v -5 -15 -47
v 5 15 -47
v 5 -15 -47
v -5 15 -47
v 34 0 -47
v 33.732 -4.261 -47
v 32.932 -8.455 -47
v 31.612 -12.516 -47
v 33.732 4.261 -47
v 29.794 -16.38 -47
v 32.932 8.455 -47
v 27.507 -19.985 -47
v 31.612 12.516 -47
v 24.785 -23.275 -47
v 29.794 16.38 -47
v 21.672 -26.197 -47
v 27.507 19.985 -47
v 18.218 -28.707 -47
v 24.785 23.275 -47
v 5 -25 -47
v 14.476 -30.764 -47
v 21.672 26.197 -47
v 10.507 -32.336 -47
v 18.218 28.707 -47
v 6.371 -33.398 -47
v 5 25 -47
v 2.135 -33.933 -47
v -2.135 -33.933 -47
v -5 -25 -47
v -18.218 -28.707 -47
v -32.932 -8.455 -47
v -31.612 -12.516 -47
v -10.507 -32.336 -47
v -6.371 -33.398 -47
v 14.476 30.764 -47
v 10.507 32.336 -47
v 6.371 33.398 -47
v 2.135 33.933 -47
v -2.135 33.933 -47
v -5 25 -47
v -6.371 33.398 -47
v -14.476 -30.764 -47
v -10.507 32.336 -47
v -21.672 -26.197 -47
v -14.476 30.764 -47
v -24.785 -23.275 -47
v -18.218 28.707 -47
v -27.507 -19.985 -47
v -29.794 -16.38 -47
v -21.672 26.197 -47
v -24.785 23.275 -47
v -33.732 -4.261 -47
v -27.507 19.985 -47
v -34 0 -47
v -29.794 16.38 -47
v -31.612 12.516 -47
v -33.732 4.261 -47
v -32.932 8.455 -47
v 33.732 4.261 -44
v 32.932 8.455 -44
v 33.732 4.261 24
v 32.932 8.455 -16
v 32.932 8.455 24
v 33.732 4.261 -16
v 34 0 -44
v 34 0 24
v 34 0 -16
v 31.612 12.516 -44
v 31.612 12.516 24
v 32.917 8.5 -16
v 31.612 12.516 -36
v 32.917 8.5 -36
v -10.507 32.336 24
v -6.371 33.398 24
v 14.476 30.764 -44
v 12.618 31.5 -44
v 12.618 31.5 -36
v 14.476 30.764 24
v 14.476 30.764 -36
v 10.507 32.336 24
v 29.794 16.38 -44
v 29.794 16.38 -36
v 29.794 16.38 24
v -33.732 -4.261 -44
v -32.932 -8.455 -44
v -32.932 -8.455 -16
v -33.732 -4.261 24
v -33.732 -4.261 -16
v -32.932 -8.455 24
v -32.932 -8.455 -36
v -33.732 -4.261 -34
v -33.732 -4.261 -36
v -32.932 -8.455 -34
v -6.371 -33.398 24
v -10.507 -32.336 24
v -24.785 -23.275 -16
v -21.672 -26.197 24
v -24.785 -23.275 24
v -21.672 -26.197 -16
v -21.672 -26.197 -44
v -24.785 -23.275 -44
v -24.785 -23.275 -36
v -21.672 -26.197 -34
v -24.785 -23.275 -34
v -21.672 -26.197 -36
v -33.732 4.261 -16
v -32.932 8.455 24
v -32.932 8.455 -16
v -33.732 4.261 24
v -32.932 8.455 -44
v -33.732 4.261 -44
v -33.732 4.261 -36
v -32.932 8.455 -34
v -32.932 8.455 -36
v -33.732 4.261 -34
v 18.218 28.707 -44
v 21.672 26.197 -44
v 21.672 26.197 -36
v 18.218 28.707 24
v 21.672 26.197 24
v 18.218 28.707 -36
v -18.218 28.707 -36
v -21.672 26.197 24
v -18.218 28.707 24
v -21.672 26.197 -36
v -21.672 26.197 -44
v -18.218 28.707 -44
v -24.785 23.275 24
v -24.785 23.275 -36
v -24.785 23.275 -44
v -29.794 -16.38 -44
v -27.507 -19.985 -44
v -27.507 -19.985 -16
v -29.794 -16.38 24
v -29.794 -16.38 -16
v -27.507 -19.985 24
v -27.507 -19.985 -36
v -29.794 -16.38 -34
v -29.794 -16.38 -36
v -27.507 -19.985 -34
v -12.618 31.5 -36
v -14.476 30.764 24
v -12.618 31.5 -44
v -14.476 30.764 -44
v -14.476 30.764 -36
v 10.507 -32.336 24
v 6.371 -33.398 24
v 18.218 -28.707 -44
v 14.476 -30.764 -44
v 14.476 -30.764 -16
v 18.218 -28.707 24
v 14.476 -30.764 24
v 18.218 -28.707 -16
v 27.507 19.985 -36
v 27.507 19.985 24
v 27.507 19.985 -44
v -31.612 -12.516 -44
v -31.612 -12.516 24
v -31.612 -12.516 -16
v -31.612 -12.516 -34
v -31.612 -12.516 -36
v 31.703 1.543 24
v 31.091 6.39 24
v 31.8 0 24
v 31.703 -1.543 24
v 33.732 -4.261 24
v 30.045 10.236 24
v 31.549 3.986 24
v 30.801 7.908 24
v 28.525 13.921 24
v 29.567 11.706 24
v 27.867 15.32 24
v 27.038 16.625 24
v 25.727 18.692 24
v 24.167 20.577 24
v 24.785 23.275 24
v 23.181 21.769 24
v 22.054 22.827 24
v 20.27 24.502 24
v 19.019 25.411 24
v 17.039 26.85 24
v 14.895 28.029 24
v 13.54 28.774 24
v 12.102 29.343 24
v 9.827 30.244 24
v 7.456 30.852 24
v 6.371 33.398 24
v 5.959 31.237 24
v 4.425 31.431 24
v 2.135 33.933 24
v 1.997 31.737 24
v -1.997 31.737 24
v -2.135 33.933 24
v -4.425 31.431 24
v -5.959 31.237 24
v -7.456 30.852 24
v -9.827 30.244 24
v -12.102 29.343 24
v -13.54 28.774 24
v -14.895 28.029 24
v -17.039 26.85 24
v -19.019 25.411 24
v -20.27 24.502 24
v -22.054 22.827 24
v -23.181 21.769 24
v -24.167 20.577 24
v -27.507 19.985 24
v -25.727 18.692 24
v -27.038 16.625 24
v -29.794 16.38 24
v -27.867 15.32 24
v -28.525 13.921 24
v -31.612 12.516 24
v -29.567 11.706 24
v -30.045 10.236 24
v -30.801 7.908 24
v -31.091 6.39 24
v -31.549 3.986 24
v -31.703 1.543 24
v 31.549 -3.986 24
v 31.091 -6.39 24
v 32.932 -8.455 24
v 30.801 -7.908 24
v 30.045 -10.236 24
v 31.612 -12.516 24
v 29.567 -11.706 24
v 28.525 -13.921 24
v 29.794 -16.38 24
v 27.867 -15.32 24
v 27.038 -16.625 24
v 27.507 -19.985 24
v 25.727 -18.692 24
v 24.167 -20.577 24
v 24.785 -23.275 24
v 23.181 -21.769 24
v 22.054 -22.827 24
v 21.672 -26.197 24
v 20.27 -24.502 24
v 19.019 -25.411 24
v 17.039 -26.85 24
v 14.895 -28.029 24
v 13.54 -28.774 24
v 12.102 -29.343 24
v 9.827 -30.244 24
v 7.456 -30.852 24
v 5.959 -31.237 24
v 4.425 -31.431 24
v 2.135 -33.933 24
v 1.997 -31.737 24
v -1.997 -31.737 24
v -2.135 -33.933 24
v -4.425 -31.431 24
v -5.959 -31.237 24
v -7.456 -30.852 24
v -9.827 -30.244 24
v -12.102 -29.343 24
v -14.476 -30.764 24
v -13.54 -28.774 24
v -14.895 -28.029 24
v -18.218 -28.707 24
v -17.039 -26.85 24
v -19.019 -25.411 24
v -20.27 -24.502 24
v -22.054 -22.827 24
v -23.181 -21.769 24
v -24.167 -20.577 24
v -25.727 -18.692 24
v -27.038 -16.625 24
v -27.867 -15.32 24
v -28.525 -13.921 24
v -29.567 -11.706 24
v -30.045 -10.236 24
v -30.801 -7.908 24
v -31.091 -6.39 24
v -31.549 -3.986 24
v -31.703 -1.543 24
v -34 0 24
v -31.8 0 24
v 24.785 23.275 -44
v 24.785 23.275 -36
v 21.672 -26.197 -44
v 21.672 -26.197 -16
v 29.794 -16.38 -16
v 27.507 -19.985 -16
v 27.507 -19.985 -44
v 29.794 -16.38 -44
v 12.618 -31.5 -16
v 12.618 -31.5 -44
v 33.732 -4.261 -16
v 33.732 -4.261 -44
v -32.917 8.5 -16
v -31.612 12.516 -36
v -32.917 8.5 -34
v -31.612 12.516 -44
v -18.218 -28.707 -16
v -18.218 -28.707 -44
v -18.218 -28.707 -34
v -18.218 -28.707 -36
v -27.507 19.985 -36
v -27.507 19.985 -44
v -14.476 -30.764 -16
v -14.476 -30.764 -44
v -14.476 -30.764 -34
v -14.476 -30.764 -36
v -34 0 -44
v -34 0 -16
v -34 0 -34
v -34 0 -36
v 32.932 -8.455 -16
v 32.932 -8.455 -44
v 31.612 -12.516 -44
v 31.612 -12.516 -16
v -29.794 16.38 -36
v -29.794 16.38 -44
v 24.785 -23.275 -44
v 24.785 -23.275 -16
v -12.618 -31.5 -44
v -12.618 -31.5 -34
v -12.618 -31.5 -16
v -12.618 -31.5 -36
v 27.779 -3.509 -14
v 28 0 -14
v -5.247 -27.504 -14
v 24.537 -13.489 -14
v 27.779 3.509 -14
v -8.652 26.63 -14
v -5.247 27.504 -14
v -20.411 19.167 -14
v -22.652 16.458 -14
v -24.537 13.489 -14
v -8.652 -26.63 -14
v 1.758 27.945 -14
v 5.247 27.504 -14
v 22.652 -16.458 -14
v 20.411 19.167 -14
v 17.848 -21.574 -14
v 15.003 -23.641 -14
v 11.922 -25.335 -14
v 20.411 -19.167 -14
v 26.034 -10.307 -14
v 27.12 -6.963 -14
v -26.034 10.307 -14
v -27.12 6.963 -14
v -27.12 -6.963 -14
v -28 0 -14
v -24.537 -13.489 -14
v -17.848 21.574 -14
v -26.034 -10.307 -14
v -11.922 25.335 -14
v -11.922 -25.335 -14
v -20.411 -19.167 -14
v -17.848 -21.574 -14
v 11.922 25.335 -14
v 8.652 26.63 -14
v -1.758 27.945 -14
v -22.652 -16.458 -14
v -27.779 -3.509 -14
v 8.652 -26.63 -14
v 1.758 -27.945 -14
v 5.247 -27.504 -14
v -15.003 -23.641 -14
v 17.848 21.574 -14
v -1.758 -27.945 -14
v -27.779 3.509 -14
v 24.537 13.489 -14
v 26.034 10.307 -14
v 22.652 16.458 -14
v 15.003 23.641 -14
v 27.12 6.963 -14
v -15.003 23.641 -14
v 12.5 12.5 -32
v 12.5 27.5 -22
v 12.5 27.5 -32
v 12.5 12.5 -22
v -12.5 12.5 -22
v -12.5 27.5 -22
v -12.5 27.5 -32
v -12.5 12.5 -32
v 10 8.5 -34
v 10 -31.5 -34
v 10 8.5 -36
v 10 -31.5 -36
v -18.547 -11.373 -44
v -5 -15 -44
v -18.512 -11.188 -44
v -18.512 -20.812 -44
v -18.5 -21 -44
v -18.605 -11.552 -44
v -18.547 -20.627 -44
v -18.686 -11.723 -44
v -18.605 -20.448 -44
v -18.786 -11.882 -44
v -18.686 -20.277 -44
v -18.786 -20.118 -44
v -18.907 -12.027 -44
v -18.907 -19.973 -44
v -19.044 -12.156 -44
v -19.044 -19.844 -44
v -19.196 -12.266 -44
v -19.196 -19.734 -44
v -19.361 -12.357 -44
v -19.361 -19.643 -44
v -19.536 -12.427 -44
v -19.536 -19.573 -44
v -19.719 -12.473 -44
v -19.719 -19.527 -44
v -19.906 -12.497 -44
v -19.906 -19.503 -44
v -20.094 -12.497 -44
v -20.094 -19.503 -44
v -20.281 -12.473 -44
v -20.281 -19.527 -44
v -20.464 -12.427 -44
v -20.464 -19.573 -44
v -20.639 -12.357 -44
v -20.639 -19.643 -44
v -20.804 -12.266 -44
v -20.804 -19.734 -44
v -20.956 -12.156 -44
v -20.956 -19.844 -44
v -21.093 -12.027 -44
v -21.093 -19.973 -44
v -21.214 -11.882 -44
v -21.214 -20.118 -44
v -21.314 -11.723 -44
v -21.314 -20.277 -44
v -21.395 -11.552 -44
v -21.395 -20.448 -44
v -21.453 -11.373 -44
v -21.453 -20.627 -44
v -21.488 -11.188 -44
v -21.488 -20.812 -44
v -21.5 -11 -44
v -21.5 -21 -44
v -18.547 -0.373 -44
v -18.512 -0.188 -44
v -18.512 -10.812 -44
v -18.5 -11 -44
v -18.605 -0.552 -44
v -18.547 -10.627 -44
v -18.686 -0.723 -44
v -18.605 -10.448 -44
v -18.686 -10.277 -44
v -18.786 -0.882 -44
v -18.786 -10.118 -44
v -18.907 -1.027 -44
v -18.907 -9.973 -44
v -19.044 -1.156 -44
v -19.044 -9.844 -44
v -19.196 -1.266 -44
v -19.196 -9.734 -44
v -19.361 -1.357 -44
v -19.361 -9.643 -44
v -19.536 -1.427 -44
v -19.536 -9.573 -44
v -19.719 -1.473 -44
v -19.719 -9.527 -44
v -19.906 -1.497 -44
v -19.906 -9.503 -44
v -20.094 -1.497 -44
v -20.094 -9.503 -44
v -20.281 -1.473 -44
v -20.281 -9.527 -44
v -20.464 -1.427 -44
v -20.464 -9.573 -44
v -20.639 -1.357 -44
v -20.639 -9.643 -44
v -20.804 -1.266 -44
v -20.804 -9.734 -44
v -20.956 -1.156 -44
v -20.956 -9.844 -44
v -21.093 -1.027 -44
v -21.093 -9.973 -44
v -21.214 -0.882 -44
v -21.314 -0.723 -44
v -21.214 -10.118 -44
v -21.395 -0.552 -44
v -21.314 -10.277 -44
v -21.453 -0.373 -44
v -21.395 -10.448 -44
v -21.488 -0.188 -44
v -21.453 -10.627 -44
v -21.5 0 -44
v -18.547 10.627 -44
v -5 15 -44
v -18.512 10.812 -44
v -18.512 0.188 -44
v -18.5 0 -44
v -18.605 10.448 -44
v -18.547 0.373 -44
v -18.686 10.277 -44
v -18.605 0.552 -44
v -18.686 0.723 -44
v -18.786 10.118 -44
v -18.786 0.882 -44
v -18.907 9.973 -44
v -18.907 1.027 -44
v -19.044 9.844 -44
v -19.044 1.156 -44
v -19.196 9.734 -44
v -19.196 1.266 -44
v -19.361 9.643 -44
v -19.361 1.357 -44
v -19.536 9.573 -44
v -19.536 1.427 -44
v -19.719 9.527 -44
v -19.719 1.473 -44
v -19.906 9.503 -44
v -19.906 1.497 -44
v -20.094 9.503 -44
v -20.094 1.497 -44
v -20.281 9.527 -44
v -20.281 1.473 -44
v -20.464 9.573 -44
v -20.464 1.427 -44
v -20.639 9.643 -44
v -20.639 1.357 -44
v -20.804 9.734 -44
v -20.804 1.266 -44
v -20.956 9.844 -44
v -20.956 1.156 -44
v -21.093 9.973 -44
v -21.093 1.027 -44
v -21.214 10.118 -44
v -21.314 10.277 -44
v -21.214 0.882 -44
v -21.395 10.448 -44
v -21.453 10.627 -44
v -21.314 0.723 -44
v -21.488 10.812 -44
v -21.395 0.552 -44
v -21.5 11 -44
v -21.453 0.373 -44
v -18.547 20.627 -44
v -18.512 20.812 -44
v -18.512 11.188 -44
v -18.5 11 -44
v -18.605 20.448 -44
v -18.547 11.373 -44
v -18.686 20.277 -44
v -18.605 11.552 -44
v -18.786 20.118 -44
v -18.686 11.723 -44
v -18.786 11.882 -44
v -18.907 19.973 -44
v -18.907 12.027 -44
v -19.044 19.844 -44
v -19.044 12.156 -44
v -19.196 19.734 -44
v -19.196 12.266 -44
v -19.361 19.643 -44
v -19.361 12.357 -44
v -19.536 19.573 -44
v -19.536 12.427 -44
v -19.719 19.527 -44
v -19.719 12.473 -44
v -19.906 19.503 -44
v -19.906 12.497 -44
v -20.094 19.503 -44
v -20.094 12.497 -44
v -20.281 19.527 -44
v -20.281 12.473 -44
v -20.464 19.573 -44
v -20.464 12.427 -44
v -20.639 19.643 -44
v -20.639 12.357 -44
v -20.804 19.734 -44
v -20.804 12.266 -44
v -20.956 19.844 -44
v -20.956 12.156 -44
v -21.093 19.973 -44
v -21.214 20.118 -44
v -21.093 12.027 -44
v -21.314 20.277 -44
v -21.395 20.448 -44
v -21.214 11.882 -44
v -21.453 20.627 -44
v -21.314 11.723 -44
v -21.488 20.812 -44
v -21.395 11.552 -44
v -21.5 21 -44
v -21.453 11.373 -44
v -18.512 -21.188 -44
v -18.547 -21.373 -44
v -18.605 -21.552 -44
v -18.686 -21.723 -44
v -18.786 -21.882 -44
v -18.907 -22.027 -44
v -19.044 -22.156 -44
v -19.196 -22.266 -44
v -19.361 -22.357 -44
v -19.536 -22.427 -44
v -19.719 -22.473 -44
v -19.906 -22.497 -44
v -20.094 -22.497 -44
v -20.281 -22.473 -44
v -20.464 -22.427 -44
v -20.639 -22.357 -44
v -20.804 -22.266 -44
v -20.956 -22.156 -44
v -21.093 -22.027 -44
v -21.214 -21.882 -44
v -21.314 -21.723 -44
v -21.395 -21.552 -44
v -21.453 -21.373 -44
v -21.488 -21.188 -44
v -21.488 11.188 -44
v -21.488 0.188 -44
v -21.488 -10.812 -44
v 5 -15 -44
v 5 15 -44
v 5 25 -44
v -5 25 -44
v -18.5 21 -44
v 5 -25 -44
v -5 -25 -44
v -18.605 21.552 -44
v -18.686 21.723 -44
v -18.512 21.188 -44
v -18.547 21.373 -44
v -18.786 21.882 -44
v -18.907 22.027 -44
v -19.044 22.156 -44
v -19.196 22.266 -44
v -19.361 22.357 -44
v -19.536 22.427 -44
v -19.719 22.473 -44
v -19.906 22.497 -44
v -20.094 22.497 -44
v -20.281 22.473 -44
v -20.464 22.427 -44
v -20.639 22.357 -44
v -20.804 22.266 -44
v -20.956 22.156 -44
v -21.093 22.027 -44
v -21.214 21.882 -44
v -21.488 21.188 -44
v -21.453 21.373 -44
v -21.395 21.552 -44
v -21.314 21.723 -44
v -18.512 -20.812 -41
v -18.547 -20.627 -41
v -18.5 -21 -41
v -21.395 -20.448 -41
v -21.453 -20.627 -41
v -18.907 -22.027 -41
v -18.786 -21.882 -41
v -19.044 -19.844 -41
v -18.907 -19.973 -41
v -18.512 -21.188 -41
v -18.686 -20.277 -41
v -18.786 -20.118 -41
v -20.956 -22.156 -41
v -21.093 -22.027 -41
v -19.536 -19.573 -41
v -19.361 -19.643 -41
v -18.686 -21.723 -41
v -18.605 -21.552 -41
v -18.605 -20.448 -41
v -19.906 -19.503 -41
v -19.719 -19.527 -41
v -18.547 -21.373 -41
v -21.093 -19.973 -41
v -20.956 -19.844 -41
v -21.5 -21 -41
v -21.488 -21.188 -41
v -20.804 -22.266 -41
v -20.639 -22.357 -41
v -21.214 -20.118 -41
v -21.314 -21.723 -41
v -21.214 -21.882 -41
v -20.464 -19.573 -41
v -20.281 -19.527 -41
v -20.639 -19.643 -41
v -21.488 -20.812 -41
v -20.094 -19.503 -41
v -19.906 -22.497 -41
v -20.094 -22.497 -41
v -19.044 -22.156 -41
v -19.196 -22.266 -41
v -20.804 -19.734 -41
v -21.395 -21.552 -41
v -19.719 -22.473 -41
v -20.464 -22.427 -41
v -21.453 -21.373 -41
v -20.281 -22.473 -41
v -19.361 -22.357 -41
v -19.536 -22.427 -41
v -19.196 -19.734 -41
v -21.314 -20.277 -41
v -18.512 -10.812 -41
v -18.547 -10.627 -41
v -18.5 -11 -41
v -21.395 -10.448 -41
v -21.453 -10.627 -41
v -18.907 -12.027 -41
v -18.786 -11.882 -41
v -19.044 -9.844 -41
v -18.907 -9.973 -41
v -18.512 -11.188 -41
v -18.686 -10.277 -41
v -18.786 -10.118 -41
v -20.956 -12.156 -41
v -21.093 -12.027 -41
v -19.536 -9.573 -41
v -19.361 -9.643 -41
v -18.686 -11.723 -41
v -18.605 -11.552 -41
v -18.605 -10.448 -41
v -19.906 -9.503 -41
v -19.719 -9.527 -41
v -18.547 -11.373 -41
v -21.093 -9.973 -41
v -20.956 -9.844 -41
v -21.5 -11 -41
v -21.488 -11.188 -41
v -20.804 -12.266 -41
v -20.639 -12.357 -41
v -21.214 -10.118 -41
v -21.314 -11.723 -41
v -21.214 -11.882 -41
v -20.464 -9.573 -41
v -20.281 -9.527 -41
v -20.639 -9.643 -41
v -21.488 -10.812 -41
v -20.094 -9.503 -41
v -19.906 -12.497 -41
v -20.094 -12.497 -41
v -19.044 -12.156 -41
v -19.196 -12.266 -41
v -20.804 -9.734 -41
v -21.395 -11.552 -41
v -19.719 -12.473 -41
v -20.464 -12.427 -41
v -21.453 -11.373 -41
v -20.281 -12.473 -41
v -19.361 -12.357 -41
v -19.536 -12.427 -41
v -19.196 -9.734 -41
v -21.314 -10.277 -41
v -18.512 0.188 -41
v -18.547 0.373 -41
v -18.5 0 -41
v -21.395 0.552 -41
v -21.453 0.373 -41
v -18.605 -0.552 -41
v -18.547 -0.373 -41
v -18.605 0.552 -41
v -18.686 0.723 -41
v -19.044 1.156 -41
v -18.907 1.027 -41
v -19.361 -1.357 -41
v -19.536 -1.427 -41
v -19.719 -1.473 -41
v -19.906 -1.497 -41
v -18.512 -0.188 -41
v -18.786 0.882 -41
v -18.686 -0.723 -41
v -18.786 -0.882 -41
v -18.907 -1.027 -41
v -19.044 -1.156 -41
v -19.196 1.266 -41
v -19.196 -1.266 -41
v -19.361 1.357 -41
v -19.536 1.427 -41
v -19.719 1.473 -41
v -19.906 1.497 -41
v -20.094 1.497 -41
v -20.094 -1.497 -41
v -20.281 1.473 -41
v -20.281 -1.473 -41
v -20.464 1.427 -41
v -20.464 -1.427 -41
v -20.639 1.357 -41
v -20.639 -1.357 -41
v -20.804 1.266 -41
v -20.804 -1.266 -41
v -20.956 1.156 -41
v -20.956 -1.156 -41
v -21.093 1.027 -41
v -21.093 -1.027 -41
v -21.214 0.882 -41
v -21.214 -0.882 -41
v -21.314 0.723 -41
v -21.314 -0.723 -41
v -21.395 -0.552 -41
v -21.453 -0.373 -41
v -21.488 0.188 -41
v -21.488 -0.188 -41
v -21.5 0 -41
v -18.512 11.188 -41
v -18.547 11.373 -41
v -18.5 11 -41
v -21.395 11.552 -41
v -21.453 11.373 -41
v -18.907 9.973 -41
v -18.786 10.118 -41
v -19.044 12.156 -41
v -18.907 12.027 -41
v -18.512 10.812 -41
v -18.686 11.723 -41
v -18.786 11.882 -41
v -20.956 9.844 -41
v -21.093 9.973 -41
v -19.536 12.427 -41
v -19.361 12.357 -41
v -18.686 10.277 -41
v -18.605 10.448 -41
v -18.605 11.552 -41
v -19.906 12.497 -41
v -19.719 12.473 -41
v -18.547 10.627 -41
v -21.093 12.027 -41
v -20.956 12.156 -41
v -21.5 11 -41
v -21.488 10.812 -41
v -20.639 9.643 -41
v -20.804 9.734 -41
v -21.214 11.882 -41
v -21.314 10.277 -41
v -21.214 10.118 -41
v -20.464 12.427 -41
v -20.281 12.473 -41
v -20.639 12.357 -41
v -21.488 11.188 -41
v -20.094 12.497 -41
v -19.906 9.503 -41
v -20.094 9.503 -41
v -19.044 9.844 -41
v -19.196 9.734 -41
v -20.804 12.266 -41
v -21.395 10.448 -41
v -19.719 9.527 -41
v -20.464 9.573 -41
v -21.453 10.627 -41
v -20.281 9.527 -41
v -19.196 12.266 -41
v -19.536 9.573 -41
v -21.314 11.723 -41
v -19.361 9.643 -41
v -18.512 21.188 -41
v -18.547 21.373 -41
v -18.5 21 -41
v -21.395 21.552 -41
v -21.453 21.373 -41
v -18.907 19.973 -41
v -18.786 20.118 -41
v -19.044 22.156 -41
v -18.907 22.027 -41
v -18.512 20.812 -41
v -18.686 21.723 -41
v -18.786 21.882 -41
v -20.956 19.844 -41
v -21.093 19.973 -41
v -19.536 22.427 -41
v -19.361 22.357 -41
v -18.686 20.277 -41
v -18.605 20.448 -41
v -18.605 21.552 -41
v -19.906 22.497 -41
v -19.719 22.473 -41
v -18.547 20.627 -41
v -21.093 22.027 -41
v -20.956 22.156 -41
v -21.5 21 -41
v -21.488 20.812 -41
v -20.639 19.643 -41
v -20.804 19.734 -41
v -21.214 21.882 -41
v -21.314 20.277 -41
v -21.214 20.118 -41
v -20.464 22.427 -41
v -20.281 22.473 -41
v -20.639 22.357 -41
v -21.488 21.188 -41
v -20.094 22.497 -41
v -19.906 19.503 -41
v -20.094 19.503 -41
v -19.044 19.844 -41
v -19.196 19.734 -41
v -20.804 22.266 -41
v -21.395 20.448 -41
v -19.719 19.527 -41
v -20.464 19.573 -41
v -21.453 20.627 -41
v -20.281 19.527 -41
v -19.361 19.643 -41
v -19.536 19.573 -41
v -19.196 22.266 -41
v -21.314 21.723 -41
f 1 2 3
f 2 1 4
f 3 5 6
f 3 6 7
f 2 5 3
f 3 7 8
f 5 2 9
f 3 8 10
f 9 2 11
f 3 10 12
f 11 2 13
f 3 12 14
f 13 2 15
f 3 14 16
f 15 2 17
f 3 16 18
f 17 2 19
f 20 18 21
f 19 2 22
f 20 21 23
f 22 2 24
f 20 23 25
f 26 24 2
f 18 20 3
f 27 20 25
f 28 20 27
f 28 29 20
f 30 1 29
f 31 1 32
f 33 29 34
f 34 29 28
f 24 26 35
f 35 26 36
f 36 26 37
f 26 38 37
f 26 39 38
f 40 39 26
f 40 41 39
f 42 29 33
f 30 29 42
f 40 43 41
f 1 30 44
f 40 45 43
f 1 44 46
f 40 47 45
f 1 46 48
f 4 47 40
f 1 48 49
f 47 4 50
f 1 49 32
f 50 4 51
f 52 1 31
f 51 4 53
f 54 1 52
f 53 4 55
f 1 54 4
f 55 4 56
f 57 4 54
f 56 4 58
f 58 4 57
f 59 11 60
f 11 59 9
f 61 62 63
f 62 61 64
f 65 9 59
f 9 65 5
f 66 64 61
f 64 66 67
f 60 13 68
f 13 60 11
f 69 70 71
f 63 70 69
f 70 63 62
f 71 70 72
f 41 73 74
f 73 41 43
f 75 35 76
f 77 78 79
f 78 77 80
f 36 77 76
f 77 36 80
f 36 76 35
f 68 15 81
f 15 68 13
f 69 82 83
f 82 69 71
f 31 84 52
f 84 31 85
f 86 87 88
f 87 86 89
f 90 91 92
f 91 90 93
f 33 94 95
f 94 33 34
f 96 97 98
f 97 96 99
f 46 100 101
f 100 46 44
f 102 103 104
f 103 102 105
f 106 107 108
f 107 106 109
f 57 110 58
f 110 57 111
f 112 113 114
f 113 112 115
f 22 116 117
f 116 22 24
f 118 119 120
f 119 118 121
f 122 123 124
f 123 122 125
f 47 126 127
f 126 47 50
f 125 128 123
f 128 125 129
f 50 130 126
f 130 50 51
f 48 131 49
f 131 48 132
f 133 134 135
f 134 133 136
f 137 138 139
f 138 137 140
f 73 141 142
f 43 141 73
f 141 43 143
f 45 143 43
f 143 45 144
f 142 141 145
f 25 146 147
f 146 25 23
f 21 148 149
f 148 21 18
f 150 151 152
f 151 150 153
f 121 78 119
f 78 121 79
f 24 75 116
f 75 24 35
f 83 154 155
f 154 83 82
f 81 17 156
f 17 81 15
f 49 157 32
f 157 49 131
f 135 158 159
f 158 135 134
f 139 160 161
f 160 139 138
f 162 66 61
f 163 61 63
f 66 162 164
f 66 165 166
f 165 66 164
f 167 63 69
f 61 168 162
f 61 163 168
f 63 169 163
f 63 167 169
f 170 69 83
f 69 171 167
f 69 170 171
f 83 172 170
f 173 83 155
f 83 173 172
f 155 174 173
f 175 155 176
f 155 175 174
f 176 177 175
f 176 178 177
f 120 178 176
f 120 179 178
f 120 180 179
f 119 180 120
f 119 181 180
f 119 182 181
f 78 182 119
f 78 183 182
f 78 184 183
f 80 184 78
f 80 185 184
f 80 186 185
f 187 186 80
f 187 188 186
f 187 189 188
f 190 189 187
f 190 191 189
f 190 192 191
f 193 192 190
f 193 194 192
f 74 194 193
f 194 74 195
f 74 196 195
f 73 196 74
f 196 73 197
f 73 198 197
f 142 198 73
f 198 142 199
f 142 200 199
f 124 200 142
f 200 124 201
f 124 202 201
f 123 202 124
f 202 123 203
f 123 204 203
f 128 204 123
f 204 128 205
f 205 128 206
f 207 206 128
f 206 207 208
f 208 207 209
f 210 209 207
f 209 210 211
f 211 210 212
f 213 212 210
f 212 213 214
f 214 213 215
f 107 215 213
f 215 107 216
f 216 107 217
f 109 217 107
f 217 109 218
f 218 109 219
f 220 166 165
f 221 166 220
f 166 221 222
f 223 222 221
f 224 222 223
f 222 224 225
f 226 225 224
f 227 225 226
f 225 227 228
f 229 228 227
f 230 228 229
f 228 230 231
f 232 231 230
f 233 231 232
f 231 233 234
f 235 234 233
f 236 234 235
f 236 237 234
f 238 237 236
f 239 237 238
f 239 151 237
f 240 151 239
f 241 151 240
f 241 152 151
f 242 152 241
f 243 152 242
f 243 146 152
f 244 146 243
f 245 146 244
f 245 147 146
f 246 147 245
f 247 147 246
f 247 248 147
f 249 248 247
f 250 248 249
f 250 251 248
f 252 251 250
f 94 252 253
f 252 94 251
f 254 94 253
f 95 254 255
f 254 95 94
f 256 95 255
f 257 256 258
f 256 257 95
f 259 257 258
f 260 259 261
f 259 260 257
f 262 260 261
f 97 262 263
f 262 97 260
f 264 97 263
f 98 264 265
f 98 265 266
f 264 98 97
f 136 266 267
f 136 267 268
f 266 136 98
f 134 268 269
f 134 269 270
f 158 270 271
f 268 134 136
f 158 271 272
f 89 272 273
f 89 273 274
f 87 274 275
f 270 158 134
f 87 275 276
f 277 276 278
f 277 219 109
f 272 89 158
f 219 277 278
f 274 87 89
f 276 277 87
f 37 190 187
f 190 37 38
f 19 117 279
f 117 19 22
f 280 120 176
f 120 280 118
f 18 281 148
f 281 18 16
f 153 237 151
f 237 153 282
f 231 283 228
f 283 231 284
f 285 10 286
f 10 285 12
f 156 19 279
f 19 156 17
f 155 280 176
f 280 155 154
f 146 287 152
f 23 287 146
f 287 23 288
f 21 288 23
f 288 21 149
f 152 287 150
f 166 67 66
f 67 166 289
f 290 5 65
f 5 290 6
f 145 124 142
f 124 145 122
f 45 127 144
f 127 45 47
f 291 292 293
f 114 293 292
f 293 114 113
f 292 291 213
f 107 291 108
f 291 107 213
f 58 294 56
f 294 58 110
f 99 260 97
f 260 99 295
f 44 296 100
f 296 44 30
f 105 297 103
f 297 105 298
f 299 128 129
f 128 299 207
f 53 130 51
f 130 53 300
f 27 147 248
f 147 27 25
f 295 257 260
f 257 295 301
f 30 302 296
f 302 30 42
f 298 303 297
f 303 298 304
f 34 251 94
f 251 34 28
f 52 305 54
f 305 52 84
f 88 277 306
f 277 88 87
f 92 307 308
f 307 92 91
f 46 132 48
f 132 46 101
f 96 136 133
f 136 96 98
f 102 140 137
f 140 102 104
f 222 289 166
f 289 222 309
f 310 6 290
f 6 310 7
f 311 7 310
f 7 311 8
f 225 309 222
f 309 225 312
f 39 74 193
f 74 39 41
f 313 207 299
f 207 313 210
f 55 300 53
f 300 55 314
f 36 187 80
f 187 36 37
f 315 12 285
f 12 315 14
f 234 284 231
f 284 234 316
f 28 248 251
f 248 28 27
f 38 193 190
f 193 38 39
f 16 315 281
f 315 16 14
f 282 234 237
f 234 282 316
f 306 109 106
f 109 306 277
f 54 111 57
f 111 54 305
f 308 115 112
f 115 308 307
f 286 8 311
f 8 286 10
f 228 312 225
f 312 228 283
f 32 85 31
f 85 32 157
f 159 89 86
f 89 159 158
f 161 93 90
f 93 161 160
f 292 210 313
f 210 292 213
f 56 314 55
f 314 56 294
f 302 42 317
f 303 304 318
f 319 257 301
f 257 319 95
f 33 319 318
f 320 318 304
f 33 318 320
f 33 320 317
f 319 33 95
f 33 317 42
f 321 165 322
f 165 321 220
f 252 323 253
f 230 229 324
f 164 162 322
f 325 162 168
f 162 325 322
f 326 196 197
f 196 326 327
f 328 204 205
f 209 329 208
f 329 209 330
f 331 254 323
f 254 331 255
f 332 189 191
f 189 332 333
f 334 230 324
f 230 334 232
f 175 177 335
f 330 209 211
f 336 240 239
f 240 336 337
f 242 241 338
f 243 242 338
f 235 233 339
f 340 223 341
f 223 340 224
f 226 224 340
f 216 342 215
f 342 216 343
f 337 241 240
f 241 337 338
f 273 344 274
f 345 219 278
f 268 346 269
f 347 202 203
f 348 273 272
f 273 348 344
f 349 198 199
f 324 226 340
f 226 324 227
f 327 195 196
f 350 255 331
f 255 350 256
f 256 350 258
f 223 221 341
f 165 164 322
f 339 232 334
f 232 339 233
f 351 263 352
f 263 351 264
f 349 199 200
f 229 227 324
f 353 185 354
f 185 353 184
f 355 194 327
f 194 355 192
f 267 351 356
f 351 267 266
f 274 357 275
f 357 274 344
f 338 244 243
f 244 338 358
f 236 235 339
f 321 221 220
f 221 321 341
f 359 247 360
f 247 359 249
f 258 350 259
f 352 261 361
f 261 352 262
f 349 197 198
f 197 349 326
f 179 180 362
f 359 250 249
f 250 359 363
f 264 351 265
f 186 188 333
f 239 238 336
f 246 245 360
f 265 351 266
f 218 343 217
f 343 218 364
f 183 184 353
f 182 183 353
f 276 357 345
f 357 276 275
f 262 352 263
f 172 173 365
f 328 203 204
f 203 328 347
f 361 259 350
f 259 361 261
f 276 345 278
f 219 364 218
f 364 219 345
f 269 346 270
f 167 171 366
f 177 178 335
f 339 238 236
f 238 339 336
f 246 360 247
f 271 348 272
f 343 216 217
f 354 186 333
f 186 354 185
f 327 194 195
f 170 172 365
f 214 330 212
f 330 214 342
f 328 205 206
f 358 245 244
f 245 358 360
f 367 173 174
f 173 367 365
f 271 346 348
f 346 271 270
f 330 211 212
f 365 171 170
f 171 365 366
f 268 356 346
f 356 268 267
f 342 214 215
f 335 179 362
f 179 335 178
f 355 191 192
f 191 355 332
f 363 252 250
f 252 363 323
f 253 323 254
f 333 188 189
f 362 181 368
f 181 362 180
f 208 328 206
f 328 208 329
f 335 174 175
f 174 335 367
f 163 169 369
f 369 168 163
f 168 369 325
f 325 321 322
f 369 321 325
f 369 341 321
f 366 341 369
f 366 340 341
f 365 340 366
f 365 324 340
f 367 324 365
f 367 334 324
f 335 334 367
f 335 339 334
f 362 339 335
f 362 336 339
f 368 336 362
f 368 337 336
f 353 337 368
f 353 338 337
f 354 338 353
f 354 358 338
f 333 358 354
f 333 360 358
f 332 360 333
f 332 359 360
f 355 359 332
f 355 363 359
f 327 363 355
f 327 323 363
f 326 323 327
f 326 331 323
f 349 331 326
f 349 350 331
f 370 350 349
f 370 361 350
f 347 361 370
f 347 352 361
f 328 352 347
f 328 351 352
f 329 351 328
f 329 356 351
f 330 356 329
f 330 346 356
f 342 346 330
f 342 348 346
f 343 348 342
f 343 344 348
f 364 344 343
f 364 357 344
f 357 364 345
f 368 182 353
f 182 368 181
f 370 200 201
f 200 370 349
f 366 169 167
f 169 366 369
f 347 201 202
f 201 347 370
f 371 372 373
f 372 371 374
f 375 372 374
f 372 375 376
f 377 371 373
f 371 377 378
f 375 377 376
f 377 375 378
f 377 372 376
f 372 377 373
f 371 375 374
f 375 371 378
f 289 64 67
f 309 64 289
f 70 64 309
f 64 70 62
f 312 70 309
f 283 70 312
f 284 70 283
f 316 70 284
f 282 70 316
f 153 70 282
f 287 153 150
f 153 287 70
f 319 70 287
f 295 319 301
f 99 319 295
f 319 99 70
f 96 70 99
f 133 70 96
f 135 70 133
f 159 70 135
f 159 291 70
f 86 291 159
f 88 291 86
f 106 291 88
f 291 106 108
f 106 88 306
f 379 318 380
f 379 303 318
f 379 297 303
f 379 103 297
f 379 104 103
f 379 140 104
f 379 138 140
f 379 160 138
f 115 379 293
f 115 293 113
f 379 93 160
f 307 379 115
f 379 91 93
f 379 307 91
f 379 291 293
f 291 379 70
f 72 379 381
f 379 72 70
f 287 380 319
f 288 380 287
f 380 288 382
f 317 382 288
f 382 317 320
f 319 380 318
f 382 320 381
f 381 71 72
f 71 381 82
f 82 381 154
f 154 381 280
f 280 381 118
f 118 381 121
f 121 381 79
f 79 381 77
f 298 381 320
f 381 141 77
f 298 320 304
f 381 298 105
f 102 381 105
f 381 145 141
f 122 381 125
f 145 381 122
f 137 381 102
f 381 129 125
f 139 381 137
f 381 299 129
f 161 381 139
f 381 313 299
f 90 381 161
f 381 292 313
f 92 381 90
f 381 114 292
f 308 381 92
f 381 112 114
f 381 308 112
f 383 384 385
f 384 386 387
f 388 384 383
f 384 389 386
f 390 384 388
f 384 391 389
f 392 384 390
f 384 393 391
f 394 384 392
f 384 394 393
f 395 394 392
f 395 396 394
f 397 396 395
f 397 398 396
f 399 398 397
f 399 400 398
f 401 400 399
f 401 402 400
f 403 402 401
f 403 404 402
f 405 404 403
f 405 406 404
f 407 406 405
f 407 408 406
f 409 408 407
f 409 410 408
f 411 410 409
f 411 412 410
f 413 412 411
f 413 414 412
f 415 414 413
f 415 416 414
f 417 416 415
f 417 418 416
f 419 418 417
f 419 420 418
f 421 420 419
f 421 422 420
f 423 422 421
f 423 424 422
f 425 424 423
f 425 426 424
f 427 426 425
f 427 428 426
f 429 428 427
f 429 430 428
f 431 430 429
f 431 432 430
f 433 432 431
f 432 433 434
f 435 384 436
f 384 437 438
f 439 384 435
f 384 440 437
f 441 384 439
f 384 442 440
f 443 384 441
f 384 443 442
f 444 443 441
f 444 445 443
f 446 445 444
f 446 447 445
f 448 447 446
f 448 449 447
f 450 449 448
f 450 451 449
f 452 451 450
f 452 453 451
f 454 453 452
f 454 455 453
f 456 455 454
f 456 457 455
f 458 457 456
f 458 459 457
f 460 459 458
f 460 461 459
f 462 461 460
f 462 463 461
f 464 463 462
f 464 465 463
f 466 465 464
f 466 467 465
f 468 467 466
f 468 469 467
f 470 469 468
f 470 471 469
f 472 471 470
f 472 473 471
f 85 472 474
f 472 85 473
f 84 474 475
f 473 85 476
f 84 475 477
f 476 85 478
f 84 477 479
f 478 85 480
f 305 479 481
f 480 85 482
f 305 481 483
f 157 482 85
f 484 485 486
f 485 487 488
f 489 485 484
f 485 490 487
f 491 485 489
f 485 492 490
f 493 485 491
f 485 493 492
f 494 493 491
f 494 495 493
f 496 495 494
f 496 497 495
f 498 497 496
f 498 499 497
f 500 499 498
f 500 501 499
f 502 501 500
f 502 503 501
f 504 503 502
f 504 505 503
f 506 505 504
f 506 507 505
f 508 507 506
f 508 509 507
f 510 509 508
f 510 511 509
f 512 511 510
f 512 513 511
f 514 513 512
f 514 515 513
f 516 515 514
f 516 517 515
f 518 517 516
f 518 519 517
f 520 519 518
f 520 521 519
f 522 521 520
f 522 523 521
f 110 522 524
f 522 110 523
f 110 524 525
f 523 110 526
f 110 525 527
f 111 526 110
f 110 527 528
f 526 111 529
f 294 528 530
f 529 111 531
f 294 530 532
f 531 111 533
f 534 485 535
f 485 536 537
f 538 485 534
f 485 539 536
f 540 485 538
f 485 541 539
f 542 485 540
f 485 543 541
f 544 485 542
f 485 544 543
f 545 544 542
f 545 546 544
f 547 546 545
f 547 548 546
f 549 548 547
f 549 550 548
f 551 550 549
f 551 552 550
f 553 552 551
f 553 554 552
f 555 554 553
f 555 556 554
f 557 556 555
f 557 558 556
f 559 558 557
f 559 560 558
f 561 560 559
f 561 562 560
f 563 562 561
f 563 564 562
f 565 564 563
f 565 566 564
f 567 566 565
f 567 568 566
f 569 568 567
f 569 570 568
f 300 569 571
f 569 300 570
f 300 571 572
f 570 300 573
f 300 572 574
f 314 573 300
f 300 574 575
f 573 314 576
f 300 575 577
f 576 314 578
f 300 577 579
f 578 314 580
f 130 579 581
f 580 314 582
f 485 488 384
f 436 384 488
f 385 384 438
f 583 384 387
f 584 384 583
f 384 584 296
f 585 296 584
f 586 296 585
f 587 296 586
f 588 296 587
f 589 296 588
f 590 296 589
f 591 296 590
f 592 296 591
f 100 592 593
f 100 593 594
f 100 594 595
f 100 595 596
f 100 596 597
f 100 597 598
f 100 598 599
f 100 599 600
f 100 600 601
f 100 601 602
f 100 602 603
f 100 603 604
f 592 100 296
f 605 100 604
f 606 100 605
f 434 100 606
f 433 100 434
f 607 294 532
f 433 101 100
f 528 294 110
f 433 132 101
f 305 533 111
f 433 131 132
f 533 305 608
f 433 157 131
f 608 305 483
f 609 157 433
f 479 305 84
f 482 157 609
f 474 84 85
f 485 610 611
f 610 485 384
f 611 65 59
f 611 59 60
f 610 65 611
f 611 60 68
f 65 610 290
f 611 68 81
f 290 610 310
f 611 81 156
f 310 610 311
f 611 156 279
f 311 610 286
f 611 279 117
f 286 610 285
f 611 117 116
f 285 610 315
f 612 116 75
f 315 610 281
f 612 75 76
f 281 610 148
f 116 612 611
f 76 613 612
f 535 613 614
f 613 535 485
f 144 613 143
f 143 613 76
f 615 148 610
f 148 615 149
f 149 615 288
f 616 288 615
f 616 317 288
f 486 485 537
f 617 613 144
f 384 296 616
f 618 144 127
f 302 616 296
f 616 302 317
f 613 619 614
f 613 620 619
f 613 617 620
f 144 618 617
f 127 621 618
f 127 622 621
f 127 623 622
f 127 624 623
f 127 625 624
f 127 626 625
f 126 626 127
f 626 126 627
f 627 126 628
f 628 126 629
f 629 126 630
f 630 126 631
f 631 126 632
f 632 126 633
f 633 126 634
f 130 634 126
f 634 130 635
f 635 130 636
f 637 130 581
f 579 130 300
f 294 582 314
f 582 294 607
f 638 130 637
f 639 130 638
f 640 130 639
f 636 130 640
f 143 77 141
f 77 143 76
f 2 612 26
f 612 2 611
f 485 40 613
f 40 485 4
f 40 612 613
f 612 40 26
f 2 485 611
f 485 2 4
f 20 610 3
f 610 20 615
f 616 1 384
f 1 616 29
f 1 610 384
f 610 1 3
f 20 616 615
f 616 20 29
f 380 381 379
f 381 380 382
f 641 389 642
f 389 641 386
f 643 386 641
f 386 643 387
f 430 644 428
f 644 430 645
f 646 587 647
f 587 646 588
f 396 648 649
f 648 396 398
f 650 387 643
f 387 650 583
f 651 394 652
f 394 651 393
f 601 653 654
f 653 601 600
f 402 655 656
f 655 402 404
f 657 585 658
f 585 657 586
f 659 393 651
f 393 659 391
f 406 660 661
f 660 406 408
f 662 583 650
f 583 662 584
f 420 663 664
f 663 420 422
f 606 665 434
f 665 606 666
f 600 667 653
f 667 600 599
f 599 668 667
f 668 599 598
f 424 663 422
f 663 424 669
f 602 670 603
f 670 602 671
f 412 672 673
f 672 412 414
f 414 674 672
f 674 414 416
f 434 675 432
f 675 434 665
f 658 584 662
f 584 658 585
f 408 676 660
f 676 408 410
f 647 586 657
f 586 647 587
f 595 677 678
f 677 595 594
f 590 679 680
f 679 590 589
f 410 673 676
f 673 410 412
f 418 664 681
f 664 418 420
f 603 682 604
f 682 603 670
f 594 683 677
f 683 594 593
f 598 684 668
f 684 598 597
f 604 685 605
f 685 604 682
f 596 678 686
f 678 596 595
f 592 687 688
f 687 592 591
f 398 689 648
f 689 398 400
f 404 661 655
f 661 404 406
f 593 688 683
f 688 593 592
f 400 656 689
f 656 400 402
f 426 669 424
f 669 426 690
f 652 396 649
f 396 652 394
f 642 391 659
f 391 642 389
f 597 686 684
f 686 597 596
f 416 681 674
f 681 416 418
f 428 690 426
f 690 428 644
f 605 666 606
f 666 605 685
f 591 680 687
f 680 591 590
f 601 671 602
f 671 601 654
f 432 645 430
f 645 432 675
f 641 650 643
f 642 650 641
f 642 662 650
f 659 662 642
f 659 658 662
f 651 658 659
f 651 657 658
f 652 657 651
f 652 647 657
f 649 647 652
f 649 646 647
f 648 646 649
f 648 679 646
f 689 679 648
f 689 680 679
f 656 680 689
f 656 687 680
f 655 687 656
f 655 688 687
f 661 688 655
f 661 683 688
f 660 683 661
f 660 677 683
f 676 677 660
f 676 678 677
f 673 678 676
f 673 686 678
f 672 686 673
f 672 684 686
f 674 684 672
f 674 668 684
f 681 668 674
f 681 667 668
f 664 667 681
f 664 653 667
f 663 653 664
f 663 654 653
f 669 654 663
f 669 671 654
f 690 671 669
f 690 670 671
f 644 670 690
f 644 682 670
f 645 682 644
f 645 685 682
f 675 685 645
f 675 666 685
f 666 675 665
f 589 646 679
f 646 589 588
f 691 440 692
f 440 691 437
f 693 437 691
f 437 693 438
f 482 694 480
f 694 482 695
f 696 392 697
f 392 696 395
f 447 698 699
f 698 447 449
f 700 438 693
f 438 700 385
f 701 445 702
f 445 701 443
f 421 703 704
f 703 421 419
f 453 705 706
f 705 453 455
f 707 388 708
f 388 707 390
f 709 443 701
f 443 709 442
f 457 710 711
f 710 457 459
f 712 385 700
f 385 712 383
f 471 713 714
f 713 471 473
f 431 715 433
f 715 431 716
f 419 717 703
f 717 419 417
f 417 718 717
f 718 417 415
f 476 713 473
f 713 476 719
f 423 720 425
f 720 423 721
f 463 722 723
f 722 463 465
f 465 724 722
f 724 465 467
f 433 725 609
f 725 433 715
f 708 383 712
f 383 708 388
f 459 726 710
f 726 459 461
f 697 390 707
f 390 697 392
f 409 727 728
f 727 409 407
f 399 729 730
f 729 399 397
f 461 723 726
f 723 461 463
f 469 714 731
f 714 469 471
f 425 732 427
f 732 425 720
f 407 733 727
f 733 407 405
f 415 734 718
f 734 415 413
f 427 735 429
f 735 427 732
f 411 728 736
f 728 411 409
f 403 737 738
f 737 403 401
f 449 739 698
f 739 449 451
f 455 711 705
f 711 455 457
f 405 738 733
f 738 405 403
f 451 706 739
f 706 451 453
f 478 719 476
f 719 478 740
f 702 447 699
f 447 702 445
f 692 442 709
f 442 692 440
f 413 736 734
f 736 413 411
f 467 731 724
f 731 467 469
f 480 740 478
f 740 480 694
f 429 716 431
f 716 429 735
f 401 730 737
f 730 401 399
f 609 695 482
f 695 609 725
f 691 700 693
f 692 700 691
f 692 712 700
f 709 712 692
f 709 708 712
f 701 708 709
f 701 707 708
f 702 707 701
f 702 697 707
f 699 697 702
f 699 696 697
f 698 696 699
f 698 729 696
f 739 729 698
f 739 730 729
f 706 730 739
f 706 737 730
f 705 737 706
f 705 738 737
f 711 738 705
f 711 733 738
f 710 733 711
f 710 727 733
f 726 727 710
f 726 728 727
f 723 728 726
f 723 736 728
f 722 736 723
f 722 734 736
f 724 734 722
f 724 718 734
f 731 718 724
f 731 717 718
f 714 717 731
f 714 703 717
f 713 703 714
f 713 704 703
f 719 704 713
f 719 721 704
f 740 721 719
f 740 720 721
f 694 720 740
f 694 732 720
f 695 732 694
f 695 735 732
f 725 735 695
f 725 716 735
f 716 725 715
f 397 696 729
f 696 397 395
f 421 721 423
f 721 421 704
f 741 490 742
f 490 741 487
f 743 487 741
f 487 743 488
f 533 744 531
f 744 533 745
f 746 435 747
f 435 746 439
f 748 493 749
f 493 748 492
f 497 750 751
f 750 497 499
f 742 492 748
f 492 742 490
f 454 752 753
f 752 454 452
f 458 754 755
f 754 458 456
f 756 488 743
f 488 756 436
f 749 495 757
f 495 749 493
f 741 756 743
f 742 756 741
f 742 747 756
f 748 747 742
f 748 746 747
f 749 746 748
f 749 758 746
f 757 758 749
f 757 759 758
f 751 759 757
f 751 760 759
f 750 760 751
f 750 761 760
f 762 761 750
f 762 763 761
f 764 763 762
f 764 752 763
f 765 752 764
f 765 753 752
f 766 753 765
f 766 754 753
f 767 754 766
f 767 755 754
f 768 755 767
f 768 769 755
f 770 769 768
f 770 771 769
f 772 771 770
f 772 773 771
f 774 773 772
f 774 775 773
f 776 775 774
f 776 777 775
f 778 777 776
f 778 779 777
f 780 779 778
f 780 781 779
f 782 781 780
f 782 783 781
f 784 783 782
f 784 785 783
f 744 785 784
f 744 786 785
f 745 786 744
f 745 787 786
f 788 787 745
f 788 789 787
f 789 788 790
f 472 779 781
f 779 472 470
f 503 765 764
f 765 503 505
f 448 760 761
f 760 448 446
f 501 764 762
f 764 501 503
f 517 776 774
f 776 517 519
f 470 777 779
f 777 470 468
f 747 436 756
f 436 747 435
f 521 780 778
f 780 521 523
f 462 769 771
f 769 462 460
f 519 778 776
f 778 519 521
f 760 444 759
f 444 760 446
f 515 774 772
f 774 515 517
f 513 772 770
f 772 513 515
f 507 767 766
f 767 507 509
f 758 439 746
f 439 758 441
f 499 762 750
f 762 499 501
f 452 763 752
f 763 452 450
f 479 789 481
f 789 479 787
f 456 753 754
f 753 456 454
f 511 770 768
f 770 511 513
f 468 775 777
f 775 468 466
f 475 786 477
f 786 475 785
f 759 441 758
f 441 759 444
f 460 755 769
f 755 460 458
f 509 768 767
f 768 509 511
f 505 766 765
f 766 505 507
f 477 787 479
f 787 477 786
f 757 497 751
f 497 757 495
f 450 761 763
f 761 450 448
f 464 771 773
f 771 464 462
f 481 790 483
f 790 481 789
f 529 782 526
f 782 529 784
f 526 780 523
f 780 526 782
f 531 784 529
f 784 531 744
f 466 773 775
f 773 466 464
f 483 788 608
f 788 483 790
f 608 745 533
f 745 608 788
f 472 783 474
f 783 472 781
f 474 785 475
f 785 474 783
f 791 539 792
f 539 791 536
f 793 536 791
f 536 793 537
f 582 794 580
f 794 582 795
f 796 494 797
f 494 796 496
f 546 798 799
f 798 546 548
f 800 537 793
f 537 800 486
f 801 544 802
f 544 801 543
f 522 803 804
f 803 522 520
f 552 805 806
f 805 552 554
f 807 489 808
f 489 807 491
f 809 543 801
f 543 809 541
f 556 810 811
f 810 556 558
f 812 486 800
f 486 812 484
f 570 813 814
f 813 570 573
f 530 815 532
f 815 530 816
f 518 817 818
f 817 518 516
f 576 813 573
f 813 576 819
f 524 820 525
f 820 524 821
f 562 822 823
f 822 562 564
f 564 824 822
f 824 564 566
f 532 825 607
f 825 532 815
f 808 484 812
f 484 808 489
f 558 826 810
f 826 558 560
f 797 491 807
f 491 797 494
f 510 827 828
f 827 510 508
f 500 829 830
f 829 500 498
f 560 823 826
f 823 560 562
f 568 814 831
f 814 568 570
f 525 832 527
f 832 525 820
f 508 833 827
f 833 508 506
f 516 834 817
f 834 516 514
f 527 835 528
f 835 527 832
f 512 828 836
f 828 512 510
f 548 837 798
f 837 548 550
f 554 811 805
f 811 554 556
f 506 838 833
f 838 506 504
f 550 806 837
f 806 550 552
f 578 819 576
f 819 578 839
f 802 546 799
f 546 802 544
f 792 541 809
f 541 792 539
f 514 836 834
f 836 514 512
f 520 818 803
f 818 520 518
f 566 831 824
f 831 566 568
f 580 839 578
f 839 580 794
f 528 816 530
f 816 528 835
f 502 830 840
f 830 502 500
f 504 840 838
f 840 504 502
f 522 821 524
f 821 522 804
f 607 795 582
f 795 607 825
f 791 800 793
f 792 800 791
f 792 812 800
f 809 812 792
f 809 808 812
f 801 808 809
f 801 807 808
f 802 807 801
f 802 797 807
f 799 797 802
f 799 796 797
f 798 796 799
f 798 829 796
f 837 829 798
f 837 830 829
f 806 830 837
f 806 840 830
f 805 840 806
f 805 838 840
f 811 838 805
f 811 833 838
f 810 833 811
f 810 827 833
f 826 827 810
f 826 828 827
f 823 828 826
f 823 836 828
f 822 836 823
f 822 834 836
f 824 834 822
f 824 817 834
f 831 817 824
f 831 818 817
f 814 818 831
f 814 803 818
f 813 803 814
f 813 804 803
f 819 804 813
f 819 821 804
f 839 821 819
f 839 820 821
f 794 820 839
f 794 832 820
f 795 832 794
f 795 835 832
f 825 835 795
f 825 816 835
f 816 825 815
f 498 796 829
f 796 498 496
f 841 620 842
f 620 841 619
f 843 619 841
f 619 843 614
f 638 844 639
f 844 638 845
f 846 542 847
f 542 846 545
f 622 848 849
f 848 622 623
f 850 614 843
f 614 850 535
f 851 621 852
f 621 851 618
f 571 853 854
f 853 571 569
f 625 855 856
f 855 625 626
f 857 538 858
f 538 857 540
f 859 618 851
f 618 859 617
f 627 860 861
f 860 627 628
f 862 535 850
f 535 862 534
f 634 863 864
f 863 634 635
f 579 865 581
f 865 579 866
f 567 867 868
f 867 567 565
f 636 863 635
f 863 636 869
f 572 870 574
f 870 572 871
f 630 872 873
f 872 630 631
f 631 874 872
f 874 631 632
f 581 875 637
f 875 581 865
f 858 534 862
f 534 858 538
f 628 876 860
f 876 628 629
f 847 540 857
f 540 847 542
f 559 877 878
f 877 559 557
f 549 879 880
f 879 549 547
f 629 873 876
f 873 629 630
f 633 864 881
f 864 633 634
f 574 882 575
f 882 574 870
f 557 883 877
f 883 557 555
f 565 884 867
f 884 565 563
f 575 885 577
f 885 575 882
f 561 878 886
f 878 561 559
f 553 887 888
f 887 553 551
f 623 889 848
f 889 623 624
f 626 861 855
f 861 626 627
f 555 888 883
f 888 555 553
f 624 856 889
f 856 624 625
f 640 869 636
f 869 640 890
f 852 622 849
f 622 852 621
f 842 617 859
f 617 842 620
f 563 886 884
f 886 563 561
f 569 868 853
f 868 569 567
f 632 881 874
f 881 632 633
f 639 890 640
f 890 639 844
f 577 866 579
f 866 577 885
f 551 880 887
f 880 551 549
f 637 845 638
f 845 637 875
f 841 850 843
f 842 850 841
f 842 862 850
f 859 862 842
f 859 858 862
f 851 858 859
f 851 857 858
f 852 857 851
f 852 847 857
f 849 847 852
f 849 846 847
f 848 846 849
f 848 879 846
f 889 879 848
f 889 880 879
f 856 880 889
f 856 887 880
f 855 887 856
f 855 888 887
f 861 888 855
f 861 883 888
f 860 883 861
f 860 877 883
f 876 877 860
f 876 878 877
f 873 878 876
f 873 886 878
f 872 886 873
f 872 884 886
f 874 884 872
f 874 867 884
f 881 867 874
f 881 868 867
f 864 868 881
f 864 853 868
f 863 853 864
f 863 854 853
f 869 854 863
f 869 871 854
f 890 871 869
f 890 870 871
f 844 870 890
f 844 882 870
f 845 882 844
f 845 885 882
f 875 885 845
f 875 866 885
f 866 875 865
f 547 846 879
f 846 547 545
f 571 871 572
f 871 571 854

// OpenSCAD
difference(){

    difference(){
        translate([0,0,-47]){
            //Outer cylinder
            cylinder($fn = 50, h=71, r1=34, r2=34, center=false);
        }
        translate([0,0,-14]){
            //Coffee cup - cut out
            cylinder($fn = 50, h=125, r1=28, r2=40.5, center=false);
        }
        translate([0,20,-27]){
            //Hollow end
            cube([25,15,10],true);
        }
    }

    translate([25,-11.5,-25]){
        //Battery slot
        cube([200,40,18],true);
    }
    
    translate([0,0,-40]){
        //Microbit slot
        cube([200,63,8],true);
    }
    difference(){
        translate([0,20,-49]){
            //Microbit button slot right
            cube([10,10,12],true);
        }
    }
    
    difference(){
        translate([0,-20,-49]){
            //Microbit button slot left
            cube([10,10,12],true);
        }
    }
    
    difference(){
        translate([25,-11.5,-33]){
            //Microbit button slot reset + power
            cube([30,40,10],true);
        }
    }
}

//GPIO 0
translate([-20,-21,-44]){
    cylinder($fn = 50, h=3, r1=1.5, r2=1.5, center=false);
}

//GPIO 1
translate([-20,-11,-44]){
    cylinder($fn = 50, h=3, r1=1.5, r2=1.5, center=false);
}

//GPIO 2
translate([-20,0,-44]){
    cylinder($fn = 50, h=3, r1=1.5, r2=1.5, center=false);
}

//3V
translate([-20,11,-44]){
    cylinder($fn = 50, h=3, r1=1.5, r2=1.5, center=false);
}

//GND
translate([-20,21,-44]){
    cylinder($fn = 50, h=3, r1=1.5, r2=1.5, center=false);
}
